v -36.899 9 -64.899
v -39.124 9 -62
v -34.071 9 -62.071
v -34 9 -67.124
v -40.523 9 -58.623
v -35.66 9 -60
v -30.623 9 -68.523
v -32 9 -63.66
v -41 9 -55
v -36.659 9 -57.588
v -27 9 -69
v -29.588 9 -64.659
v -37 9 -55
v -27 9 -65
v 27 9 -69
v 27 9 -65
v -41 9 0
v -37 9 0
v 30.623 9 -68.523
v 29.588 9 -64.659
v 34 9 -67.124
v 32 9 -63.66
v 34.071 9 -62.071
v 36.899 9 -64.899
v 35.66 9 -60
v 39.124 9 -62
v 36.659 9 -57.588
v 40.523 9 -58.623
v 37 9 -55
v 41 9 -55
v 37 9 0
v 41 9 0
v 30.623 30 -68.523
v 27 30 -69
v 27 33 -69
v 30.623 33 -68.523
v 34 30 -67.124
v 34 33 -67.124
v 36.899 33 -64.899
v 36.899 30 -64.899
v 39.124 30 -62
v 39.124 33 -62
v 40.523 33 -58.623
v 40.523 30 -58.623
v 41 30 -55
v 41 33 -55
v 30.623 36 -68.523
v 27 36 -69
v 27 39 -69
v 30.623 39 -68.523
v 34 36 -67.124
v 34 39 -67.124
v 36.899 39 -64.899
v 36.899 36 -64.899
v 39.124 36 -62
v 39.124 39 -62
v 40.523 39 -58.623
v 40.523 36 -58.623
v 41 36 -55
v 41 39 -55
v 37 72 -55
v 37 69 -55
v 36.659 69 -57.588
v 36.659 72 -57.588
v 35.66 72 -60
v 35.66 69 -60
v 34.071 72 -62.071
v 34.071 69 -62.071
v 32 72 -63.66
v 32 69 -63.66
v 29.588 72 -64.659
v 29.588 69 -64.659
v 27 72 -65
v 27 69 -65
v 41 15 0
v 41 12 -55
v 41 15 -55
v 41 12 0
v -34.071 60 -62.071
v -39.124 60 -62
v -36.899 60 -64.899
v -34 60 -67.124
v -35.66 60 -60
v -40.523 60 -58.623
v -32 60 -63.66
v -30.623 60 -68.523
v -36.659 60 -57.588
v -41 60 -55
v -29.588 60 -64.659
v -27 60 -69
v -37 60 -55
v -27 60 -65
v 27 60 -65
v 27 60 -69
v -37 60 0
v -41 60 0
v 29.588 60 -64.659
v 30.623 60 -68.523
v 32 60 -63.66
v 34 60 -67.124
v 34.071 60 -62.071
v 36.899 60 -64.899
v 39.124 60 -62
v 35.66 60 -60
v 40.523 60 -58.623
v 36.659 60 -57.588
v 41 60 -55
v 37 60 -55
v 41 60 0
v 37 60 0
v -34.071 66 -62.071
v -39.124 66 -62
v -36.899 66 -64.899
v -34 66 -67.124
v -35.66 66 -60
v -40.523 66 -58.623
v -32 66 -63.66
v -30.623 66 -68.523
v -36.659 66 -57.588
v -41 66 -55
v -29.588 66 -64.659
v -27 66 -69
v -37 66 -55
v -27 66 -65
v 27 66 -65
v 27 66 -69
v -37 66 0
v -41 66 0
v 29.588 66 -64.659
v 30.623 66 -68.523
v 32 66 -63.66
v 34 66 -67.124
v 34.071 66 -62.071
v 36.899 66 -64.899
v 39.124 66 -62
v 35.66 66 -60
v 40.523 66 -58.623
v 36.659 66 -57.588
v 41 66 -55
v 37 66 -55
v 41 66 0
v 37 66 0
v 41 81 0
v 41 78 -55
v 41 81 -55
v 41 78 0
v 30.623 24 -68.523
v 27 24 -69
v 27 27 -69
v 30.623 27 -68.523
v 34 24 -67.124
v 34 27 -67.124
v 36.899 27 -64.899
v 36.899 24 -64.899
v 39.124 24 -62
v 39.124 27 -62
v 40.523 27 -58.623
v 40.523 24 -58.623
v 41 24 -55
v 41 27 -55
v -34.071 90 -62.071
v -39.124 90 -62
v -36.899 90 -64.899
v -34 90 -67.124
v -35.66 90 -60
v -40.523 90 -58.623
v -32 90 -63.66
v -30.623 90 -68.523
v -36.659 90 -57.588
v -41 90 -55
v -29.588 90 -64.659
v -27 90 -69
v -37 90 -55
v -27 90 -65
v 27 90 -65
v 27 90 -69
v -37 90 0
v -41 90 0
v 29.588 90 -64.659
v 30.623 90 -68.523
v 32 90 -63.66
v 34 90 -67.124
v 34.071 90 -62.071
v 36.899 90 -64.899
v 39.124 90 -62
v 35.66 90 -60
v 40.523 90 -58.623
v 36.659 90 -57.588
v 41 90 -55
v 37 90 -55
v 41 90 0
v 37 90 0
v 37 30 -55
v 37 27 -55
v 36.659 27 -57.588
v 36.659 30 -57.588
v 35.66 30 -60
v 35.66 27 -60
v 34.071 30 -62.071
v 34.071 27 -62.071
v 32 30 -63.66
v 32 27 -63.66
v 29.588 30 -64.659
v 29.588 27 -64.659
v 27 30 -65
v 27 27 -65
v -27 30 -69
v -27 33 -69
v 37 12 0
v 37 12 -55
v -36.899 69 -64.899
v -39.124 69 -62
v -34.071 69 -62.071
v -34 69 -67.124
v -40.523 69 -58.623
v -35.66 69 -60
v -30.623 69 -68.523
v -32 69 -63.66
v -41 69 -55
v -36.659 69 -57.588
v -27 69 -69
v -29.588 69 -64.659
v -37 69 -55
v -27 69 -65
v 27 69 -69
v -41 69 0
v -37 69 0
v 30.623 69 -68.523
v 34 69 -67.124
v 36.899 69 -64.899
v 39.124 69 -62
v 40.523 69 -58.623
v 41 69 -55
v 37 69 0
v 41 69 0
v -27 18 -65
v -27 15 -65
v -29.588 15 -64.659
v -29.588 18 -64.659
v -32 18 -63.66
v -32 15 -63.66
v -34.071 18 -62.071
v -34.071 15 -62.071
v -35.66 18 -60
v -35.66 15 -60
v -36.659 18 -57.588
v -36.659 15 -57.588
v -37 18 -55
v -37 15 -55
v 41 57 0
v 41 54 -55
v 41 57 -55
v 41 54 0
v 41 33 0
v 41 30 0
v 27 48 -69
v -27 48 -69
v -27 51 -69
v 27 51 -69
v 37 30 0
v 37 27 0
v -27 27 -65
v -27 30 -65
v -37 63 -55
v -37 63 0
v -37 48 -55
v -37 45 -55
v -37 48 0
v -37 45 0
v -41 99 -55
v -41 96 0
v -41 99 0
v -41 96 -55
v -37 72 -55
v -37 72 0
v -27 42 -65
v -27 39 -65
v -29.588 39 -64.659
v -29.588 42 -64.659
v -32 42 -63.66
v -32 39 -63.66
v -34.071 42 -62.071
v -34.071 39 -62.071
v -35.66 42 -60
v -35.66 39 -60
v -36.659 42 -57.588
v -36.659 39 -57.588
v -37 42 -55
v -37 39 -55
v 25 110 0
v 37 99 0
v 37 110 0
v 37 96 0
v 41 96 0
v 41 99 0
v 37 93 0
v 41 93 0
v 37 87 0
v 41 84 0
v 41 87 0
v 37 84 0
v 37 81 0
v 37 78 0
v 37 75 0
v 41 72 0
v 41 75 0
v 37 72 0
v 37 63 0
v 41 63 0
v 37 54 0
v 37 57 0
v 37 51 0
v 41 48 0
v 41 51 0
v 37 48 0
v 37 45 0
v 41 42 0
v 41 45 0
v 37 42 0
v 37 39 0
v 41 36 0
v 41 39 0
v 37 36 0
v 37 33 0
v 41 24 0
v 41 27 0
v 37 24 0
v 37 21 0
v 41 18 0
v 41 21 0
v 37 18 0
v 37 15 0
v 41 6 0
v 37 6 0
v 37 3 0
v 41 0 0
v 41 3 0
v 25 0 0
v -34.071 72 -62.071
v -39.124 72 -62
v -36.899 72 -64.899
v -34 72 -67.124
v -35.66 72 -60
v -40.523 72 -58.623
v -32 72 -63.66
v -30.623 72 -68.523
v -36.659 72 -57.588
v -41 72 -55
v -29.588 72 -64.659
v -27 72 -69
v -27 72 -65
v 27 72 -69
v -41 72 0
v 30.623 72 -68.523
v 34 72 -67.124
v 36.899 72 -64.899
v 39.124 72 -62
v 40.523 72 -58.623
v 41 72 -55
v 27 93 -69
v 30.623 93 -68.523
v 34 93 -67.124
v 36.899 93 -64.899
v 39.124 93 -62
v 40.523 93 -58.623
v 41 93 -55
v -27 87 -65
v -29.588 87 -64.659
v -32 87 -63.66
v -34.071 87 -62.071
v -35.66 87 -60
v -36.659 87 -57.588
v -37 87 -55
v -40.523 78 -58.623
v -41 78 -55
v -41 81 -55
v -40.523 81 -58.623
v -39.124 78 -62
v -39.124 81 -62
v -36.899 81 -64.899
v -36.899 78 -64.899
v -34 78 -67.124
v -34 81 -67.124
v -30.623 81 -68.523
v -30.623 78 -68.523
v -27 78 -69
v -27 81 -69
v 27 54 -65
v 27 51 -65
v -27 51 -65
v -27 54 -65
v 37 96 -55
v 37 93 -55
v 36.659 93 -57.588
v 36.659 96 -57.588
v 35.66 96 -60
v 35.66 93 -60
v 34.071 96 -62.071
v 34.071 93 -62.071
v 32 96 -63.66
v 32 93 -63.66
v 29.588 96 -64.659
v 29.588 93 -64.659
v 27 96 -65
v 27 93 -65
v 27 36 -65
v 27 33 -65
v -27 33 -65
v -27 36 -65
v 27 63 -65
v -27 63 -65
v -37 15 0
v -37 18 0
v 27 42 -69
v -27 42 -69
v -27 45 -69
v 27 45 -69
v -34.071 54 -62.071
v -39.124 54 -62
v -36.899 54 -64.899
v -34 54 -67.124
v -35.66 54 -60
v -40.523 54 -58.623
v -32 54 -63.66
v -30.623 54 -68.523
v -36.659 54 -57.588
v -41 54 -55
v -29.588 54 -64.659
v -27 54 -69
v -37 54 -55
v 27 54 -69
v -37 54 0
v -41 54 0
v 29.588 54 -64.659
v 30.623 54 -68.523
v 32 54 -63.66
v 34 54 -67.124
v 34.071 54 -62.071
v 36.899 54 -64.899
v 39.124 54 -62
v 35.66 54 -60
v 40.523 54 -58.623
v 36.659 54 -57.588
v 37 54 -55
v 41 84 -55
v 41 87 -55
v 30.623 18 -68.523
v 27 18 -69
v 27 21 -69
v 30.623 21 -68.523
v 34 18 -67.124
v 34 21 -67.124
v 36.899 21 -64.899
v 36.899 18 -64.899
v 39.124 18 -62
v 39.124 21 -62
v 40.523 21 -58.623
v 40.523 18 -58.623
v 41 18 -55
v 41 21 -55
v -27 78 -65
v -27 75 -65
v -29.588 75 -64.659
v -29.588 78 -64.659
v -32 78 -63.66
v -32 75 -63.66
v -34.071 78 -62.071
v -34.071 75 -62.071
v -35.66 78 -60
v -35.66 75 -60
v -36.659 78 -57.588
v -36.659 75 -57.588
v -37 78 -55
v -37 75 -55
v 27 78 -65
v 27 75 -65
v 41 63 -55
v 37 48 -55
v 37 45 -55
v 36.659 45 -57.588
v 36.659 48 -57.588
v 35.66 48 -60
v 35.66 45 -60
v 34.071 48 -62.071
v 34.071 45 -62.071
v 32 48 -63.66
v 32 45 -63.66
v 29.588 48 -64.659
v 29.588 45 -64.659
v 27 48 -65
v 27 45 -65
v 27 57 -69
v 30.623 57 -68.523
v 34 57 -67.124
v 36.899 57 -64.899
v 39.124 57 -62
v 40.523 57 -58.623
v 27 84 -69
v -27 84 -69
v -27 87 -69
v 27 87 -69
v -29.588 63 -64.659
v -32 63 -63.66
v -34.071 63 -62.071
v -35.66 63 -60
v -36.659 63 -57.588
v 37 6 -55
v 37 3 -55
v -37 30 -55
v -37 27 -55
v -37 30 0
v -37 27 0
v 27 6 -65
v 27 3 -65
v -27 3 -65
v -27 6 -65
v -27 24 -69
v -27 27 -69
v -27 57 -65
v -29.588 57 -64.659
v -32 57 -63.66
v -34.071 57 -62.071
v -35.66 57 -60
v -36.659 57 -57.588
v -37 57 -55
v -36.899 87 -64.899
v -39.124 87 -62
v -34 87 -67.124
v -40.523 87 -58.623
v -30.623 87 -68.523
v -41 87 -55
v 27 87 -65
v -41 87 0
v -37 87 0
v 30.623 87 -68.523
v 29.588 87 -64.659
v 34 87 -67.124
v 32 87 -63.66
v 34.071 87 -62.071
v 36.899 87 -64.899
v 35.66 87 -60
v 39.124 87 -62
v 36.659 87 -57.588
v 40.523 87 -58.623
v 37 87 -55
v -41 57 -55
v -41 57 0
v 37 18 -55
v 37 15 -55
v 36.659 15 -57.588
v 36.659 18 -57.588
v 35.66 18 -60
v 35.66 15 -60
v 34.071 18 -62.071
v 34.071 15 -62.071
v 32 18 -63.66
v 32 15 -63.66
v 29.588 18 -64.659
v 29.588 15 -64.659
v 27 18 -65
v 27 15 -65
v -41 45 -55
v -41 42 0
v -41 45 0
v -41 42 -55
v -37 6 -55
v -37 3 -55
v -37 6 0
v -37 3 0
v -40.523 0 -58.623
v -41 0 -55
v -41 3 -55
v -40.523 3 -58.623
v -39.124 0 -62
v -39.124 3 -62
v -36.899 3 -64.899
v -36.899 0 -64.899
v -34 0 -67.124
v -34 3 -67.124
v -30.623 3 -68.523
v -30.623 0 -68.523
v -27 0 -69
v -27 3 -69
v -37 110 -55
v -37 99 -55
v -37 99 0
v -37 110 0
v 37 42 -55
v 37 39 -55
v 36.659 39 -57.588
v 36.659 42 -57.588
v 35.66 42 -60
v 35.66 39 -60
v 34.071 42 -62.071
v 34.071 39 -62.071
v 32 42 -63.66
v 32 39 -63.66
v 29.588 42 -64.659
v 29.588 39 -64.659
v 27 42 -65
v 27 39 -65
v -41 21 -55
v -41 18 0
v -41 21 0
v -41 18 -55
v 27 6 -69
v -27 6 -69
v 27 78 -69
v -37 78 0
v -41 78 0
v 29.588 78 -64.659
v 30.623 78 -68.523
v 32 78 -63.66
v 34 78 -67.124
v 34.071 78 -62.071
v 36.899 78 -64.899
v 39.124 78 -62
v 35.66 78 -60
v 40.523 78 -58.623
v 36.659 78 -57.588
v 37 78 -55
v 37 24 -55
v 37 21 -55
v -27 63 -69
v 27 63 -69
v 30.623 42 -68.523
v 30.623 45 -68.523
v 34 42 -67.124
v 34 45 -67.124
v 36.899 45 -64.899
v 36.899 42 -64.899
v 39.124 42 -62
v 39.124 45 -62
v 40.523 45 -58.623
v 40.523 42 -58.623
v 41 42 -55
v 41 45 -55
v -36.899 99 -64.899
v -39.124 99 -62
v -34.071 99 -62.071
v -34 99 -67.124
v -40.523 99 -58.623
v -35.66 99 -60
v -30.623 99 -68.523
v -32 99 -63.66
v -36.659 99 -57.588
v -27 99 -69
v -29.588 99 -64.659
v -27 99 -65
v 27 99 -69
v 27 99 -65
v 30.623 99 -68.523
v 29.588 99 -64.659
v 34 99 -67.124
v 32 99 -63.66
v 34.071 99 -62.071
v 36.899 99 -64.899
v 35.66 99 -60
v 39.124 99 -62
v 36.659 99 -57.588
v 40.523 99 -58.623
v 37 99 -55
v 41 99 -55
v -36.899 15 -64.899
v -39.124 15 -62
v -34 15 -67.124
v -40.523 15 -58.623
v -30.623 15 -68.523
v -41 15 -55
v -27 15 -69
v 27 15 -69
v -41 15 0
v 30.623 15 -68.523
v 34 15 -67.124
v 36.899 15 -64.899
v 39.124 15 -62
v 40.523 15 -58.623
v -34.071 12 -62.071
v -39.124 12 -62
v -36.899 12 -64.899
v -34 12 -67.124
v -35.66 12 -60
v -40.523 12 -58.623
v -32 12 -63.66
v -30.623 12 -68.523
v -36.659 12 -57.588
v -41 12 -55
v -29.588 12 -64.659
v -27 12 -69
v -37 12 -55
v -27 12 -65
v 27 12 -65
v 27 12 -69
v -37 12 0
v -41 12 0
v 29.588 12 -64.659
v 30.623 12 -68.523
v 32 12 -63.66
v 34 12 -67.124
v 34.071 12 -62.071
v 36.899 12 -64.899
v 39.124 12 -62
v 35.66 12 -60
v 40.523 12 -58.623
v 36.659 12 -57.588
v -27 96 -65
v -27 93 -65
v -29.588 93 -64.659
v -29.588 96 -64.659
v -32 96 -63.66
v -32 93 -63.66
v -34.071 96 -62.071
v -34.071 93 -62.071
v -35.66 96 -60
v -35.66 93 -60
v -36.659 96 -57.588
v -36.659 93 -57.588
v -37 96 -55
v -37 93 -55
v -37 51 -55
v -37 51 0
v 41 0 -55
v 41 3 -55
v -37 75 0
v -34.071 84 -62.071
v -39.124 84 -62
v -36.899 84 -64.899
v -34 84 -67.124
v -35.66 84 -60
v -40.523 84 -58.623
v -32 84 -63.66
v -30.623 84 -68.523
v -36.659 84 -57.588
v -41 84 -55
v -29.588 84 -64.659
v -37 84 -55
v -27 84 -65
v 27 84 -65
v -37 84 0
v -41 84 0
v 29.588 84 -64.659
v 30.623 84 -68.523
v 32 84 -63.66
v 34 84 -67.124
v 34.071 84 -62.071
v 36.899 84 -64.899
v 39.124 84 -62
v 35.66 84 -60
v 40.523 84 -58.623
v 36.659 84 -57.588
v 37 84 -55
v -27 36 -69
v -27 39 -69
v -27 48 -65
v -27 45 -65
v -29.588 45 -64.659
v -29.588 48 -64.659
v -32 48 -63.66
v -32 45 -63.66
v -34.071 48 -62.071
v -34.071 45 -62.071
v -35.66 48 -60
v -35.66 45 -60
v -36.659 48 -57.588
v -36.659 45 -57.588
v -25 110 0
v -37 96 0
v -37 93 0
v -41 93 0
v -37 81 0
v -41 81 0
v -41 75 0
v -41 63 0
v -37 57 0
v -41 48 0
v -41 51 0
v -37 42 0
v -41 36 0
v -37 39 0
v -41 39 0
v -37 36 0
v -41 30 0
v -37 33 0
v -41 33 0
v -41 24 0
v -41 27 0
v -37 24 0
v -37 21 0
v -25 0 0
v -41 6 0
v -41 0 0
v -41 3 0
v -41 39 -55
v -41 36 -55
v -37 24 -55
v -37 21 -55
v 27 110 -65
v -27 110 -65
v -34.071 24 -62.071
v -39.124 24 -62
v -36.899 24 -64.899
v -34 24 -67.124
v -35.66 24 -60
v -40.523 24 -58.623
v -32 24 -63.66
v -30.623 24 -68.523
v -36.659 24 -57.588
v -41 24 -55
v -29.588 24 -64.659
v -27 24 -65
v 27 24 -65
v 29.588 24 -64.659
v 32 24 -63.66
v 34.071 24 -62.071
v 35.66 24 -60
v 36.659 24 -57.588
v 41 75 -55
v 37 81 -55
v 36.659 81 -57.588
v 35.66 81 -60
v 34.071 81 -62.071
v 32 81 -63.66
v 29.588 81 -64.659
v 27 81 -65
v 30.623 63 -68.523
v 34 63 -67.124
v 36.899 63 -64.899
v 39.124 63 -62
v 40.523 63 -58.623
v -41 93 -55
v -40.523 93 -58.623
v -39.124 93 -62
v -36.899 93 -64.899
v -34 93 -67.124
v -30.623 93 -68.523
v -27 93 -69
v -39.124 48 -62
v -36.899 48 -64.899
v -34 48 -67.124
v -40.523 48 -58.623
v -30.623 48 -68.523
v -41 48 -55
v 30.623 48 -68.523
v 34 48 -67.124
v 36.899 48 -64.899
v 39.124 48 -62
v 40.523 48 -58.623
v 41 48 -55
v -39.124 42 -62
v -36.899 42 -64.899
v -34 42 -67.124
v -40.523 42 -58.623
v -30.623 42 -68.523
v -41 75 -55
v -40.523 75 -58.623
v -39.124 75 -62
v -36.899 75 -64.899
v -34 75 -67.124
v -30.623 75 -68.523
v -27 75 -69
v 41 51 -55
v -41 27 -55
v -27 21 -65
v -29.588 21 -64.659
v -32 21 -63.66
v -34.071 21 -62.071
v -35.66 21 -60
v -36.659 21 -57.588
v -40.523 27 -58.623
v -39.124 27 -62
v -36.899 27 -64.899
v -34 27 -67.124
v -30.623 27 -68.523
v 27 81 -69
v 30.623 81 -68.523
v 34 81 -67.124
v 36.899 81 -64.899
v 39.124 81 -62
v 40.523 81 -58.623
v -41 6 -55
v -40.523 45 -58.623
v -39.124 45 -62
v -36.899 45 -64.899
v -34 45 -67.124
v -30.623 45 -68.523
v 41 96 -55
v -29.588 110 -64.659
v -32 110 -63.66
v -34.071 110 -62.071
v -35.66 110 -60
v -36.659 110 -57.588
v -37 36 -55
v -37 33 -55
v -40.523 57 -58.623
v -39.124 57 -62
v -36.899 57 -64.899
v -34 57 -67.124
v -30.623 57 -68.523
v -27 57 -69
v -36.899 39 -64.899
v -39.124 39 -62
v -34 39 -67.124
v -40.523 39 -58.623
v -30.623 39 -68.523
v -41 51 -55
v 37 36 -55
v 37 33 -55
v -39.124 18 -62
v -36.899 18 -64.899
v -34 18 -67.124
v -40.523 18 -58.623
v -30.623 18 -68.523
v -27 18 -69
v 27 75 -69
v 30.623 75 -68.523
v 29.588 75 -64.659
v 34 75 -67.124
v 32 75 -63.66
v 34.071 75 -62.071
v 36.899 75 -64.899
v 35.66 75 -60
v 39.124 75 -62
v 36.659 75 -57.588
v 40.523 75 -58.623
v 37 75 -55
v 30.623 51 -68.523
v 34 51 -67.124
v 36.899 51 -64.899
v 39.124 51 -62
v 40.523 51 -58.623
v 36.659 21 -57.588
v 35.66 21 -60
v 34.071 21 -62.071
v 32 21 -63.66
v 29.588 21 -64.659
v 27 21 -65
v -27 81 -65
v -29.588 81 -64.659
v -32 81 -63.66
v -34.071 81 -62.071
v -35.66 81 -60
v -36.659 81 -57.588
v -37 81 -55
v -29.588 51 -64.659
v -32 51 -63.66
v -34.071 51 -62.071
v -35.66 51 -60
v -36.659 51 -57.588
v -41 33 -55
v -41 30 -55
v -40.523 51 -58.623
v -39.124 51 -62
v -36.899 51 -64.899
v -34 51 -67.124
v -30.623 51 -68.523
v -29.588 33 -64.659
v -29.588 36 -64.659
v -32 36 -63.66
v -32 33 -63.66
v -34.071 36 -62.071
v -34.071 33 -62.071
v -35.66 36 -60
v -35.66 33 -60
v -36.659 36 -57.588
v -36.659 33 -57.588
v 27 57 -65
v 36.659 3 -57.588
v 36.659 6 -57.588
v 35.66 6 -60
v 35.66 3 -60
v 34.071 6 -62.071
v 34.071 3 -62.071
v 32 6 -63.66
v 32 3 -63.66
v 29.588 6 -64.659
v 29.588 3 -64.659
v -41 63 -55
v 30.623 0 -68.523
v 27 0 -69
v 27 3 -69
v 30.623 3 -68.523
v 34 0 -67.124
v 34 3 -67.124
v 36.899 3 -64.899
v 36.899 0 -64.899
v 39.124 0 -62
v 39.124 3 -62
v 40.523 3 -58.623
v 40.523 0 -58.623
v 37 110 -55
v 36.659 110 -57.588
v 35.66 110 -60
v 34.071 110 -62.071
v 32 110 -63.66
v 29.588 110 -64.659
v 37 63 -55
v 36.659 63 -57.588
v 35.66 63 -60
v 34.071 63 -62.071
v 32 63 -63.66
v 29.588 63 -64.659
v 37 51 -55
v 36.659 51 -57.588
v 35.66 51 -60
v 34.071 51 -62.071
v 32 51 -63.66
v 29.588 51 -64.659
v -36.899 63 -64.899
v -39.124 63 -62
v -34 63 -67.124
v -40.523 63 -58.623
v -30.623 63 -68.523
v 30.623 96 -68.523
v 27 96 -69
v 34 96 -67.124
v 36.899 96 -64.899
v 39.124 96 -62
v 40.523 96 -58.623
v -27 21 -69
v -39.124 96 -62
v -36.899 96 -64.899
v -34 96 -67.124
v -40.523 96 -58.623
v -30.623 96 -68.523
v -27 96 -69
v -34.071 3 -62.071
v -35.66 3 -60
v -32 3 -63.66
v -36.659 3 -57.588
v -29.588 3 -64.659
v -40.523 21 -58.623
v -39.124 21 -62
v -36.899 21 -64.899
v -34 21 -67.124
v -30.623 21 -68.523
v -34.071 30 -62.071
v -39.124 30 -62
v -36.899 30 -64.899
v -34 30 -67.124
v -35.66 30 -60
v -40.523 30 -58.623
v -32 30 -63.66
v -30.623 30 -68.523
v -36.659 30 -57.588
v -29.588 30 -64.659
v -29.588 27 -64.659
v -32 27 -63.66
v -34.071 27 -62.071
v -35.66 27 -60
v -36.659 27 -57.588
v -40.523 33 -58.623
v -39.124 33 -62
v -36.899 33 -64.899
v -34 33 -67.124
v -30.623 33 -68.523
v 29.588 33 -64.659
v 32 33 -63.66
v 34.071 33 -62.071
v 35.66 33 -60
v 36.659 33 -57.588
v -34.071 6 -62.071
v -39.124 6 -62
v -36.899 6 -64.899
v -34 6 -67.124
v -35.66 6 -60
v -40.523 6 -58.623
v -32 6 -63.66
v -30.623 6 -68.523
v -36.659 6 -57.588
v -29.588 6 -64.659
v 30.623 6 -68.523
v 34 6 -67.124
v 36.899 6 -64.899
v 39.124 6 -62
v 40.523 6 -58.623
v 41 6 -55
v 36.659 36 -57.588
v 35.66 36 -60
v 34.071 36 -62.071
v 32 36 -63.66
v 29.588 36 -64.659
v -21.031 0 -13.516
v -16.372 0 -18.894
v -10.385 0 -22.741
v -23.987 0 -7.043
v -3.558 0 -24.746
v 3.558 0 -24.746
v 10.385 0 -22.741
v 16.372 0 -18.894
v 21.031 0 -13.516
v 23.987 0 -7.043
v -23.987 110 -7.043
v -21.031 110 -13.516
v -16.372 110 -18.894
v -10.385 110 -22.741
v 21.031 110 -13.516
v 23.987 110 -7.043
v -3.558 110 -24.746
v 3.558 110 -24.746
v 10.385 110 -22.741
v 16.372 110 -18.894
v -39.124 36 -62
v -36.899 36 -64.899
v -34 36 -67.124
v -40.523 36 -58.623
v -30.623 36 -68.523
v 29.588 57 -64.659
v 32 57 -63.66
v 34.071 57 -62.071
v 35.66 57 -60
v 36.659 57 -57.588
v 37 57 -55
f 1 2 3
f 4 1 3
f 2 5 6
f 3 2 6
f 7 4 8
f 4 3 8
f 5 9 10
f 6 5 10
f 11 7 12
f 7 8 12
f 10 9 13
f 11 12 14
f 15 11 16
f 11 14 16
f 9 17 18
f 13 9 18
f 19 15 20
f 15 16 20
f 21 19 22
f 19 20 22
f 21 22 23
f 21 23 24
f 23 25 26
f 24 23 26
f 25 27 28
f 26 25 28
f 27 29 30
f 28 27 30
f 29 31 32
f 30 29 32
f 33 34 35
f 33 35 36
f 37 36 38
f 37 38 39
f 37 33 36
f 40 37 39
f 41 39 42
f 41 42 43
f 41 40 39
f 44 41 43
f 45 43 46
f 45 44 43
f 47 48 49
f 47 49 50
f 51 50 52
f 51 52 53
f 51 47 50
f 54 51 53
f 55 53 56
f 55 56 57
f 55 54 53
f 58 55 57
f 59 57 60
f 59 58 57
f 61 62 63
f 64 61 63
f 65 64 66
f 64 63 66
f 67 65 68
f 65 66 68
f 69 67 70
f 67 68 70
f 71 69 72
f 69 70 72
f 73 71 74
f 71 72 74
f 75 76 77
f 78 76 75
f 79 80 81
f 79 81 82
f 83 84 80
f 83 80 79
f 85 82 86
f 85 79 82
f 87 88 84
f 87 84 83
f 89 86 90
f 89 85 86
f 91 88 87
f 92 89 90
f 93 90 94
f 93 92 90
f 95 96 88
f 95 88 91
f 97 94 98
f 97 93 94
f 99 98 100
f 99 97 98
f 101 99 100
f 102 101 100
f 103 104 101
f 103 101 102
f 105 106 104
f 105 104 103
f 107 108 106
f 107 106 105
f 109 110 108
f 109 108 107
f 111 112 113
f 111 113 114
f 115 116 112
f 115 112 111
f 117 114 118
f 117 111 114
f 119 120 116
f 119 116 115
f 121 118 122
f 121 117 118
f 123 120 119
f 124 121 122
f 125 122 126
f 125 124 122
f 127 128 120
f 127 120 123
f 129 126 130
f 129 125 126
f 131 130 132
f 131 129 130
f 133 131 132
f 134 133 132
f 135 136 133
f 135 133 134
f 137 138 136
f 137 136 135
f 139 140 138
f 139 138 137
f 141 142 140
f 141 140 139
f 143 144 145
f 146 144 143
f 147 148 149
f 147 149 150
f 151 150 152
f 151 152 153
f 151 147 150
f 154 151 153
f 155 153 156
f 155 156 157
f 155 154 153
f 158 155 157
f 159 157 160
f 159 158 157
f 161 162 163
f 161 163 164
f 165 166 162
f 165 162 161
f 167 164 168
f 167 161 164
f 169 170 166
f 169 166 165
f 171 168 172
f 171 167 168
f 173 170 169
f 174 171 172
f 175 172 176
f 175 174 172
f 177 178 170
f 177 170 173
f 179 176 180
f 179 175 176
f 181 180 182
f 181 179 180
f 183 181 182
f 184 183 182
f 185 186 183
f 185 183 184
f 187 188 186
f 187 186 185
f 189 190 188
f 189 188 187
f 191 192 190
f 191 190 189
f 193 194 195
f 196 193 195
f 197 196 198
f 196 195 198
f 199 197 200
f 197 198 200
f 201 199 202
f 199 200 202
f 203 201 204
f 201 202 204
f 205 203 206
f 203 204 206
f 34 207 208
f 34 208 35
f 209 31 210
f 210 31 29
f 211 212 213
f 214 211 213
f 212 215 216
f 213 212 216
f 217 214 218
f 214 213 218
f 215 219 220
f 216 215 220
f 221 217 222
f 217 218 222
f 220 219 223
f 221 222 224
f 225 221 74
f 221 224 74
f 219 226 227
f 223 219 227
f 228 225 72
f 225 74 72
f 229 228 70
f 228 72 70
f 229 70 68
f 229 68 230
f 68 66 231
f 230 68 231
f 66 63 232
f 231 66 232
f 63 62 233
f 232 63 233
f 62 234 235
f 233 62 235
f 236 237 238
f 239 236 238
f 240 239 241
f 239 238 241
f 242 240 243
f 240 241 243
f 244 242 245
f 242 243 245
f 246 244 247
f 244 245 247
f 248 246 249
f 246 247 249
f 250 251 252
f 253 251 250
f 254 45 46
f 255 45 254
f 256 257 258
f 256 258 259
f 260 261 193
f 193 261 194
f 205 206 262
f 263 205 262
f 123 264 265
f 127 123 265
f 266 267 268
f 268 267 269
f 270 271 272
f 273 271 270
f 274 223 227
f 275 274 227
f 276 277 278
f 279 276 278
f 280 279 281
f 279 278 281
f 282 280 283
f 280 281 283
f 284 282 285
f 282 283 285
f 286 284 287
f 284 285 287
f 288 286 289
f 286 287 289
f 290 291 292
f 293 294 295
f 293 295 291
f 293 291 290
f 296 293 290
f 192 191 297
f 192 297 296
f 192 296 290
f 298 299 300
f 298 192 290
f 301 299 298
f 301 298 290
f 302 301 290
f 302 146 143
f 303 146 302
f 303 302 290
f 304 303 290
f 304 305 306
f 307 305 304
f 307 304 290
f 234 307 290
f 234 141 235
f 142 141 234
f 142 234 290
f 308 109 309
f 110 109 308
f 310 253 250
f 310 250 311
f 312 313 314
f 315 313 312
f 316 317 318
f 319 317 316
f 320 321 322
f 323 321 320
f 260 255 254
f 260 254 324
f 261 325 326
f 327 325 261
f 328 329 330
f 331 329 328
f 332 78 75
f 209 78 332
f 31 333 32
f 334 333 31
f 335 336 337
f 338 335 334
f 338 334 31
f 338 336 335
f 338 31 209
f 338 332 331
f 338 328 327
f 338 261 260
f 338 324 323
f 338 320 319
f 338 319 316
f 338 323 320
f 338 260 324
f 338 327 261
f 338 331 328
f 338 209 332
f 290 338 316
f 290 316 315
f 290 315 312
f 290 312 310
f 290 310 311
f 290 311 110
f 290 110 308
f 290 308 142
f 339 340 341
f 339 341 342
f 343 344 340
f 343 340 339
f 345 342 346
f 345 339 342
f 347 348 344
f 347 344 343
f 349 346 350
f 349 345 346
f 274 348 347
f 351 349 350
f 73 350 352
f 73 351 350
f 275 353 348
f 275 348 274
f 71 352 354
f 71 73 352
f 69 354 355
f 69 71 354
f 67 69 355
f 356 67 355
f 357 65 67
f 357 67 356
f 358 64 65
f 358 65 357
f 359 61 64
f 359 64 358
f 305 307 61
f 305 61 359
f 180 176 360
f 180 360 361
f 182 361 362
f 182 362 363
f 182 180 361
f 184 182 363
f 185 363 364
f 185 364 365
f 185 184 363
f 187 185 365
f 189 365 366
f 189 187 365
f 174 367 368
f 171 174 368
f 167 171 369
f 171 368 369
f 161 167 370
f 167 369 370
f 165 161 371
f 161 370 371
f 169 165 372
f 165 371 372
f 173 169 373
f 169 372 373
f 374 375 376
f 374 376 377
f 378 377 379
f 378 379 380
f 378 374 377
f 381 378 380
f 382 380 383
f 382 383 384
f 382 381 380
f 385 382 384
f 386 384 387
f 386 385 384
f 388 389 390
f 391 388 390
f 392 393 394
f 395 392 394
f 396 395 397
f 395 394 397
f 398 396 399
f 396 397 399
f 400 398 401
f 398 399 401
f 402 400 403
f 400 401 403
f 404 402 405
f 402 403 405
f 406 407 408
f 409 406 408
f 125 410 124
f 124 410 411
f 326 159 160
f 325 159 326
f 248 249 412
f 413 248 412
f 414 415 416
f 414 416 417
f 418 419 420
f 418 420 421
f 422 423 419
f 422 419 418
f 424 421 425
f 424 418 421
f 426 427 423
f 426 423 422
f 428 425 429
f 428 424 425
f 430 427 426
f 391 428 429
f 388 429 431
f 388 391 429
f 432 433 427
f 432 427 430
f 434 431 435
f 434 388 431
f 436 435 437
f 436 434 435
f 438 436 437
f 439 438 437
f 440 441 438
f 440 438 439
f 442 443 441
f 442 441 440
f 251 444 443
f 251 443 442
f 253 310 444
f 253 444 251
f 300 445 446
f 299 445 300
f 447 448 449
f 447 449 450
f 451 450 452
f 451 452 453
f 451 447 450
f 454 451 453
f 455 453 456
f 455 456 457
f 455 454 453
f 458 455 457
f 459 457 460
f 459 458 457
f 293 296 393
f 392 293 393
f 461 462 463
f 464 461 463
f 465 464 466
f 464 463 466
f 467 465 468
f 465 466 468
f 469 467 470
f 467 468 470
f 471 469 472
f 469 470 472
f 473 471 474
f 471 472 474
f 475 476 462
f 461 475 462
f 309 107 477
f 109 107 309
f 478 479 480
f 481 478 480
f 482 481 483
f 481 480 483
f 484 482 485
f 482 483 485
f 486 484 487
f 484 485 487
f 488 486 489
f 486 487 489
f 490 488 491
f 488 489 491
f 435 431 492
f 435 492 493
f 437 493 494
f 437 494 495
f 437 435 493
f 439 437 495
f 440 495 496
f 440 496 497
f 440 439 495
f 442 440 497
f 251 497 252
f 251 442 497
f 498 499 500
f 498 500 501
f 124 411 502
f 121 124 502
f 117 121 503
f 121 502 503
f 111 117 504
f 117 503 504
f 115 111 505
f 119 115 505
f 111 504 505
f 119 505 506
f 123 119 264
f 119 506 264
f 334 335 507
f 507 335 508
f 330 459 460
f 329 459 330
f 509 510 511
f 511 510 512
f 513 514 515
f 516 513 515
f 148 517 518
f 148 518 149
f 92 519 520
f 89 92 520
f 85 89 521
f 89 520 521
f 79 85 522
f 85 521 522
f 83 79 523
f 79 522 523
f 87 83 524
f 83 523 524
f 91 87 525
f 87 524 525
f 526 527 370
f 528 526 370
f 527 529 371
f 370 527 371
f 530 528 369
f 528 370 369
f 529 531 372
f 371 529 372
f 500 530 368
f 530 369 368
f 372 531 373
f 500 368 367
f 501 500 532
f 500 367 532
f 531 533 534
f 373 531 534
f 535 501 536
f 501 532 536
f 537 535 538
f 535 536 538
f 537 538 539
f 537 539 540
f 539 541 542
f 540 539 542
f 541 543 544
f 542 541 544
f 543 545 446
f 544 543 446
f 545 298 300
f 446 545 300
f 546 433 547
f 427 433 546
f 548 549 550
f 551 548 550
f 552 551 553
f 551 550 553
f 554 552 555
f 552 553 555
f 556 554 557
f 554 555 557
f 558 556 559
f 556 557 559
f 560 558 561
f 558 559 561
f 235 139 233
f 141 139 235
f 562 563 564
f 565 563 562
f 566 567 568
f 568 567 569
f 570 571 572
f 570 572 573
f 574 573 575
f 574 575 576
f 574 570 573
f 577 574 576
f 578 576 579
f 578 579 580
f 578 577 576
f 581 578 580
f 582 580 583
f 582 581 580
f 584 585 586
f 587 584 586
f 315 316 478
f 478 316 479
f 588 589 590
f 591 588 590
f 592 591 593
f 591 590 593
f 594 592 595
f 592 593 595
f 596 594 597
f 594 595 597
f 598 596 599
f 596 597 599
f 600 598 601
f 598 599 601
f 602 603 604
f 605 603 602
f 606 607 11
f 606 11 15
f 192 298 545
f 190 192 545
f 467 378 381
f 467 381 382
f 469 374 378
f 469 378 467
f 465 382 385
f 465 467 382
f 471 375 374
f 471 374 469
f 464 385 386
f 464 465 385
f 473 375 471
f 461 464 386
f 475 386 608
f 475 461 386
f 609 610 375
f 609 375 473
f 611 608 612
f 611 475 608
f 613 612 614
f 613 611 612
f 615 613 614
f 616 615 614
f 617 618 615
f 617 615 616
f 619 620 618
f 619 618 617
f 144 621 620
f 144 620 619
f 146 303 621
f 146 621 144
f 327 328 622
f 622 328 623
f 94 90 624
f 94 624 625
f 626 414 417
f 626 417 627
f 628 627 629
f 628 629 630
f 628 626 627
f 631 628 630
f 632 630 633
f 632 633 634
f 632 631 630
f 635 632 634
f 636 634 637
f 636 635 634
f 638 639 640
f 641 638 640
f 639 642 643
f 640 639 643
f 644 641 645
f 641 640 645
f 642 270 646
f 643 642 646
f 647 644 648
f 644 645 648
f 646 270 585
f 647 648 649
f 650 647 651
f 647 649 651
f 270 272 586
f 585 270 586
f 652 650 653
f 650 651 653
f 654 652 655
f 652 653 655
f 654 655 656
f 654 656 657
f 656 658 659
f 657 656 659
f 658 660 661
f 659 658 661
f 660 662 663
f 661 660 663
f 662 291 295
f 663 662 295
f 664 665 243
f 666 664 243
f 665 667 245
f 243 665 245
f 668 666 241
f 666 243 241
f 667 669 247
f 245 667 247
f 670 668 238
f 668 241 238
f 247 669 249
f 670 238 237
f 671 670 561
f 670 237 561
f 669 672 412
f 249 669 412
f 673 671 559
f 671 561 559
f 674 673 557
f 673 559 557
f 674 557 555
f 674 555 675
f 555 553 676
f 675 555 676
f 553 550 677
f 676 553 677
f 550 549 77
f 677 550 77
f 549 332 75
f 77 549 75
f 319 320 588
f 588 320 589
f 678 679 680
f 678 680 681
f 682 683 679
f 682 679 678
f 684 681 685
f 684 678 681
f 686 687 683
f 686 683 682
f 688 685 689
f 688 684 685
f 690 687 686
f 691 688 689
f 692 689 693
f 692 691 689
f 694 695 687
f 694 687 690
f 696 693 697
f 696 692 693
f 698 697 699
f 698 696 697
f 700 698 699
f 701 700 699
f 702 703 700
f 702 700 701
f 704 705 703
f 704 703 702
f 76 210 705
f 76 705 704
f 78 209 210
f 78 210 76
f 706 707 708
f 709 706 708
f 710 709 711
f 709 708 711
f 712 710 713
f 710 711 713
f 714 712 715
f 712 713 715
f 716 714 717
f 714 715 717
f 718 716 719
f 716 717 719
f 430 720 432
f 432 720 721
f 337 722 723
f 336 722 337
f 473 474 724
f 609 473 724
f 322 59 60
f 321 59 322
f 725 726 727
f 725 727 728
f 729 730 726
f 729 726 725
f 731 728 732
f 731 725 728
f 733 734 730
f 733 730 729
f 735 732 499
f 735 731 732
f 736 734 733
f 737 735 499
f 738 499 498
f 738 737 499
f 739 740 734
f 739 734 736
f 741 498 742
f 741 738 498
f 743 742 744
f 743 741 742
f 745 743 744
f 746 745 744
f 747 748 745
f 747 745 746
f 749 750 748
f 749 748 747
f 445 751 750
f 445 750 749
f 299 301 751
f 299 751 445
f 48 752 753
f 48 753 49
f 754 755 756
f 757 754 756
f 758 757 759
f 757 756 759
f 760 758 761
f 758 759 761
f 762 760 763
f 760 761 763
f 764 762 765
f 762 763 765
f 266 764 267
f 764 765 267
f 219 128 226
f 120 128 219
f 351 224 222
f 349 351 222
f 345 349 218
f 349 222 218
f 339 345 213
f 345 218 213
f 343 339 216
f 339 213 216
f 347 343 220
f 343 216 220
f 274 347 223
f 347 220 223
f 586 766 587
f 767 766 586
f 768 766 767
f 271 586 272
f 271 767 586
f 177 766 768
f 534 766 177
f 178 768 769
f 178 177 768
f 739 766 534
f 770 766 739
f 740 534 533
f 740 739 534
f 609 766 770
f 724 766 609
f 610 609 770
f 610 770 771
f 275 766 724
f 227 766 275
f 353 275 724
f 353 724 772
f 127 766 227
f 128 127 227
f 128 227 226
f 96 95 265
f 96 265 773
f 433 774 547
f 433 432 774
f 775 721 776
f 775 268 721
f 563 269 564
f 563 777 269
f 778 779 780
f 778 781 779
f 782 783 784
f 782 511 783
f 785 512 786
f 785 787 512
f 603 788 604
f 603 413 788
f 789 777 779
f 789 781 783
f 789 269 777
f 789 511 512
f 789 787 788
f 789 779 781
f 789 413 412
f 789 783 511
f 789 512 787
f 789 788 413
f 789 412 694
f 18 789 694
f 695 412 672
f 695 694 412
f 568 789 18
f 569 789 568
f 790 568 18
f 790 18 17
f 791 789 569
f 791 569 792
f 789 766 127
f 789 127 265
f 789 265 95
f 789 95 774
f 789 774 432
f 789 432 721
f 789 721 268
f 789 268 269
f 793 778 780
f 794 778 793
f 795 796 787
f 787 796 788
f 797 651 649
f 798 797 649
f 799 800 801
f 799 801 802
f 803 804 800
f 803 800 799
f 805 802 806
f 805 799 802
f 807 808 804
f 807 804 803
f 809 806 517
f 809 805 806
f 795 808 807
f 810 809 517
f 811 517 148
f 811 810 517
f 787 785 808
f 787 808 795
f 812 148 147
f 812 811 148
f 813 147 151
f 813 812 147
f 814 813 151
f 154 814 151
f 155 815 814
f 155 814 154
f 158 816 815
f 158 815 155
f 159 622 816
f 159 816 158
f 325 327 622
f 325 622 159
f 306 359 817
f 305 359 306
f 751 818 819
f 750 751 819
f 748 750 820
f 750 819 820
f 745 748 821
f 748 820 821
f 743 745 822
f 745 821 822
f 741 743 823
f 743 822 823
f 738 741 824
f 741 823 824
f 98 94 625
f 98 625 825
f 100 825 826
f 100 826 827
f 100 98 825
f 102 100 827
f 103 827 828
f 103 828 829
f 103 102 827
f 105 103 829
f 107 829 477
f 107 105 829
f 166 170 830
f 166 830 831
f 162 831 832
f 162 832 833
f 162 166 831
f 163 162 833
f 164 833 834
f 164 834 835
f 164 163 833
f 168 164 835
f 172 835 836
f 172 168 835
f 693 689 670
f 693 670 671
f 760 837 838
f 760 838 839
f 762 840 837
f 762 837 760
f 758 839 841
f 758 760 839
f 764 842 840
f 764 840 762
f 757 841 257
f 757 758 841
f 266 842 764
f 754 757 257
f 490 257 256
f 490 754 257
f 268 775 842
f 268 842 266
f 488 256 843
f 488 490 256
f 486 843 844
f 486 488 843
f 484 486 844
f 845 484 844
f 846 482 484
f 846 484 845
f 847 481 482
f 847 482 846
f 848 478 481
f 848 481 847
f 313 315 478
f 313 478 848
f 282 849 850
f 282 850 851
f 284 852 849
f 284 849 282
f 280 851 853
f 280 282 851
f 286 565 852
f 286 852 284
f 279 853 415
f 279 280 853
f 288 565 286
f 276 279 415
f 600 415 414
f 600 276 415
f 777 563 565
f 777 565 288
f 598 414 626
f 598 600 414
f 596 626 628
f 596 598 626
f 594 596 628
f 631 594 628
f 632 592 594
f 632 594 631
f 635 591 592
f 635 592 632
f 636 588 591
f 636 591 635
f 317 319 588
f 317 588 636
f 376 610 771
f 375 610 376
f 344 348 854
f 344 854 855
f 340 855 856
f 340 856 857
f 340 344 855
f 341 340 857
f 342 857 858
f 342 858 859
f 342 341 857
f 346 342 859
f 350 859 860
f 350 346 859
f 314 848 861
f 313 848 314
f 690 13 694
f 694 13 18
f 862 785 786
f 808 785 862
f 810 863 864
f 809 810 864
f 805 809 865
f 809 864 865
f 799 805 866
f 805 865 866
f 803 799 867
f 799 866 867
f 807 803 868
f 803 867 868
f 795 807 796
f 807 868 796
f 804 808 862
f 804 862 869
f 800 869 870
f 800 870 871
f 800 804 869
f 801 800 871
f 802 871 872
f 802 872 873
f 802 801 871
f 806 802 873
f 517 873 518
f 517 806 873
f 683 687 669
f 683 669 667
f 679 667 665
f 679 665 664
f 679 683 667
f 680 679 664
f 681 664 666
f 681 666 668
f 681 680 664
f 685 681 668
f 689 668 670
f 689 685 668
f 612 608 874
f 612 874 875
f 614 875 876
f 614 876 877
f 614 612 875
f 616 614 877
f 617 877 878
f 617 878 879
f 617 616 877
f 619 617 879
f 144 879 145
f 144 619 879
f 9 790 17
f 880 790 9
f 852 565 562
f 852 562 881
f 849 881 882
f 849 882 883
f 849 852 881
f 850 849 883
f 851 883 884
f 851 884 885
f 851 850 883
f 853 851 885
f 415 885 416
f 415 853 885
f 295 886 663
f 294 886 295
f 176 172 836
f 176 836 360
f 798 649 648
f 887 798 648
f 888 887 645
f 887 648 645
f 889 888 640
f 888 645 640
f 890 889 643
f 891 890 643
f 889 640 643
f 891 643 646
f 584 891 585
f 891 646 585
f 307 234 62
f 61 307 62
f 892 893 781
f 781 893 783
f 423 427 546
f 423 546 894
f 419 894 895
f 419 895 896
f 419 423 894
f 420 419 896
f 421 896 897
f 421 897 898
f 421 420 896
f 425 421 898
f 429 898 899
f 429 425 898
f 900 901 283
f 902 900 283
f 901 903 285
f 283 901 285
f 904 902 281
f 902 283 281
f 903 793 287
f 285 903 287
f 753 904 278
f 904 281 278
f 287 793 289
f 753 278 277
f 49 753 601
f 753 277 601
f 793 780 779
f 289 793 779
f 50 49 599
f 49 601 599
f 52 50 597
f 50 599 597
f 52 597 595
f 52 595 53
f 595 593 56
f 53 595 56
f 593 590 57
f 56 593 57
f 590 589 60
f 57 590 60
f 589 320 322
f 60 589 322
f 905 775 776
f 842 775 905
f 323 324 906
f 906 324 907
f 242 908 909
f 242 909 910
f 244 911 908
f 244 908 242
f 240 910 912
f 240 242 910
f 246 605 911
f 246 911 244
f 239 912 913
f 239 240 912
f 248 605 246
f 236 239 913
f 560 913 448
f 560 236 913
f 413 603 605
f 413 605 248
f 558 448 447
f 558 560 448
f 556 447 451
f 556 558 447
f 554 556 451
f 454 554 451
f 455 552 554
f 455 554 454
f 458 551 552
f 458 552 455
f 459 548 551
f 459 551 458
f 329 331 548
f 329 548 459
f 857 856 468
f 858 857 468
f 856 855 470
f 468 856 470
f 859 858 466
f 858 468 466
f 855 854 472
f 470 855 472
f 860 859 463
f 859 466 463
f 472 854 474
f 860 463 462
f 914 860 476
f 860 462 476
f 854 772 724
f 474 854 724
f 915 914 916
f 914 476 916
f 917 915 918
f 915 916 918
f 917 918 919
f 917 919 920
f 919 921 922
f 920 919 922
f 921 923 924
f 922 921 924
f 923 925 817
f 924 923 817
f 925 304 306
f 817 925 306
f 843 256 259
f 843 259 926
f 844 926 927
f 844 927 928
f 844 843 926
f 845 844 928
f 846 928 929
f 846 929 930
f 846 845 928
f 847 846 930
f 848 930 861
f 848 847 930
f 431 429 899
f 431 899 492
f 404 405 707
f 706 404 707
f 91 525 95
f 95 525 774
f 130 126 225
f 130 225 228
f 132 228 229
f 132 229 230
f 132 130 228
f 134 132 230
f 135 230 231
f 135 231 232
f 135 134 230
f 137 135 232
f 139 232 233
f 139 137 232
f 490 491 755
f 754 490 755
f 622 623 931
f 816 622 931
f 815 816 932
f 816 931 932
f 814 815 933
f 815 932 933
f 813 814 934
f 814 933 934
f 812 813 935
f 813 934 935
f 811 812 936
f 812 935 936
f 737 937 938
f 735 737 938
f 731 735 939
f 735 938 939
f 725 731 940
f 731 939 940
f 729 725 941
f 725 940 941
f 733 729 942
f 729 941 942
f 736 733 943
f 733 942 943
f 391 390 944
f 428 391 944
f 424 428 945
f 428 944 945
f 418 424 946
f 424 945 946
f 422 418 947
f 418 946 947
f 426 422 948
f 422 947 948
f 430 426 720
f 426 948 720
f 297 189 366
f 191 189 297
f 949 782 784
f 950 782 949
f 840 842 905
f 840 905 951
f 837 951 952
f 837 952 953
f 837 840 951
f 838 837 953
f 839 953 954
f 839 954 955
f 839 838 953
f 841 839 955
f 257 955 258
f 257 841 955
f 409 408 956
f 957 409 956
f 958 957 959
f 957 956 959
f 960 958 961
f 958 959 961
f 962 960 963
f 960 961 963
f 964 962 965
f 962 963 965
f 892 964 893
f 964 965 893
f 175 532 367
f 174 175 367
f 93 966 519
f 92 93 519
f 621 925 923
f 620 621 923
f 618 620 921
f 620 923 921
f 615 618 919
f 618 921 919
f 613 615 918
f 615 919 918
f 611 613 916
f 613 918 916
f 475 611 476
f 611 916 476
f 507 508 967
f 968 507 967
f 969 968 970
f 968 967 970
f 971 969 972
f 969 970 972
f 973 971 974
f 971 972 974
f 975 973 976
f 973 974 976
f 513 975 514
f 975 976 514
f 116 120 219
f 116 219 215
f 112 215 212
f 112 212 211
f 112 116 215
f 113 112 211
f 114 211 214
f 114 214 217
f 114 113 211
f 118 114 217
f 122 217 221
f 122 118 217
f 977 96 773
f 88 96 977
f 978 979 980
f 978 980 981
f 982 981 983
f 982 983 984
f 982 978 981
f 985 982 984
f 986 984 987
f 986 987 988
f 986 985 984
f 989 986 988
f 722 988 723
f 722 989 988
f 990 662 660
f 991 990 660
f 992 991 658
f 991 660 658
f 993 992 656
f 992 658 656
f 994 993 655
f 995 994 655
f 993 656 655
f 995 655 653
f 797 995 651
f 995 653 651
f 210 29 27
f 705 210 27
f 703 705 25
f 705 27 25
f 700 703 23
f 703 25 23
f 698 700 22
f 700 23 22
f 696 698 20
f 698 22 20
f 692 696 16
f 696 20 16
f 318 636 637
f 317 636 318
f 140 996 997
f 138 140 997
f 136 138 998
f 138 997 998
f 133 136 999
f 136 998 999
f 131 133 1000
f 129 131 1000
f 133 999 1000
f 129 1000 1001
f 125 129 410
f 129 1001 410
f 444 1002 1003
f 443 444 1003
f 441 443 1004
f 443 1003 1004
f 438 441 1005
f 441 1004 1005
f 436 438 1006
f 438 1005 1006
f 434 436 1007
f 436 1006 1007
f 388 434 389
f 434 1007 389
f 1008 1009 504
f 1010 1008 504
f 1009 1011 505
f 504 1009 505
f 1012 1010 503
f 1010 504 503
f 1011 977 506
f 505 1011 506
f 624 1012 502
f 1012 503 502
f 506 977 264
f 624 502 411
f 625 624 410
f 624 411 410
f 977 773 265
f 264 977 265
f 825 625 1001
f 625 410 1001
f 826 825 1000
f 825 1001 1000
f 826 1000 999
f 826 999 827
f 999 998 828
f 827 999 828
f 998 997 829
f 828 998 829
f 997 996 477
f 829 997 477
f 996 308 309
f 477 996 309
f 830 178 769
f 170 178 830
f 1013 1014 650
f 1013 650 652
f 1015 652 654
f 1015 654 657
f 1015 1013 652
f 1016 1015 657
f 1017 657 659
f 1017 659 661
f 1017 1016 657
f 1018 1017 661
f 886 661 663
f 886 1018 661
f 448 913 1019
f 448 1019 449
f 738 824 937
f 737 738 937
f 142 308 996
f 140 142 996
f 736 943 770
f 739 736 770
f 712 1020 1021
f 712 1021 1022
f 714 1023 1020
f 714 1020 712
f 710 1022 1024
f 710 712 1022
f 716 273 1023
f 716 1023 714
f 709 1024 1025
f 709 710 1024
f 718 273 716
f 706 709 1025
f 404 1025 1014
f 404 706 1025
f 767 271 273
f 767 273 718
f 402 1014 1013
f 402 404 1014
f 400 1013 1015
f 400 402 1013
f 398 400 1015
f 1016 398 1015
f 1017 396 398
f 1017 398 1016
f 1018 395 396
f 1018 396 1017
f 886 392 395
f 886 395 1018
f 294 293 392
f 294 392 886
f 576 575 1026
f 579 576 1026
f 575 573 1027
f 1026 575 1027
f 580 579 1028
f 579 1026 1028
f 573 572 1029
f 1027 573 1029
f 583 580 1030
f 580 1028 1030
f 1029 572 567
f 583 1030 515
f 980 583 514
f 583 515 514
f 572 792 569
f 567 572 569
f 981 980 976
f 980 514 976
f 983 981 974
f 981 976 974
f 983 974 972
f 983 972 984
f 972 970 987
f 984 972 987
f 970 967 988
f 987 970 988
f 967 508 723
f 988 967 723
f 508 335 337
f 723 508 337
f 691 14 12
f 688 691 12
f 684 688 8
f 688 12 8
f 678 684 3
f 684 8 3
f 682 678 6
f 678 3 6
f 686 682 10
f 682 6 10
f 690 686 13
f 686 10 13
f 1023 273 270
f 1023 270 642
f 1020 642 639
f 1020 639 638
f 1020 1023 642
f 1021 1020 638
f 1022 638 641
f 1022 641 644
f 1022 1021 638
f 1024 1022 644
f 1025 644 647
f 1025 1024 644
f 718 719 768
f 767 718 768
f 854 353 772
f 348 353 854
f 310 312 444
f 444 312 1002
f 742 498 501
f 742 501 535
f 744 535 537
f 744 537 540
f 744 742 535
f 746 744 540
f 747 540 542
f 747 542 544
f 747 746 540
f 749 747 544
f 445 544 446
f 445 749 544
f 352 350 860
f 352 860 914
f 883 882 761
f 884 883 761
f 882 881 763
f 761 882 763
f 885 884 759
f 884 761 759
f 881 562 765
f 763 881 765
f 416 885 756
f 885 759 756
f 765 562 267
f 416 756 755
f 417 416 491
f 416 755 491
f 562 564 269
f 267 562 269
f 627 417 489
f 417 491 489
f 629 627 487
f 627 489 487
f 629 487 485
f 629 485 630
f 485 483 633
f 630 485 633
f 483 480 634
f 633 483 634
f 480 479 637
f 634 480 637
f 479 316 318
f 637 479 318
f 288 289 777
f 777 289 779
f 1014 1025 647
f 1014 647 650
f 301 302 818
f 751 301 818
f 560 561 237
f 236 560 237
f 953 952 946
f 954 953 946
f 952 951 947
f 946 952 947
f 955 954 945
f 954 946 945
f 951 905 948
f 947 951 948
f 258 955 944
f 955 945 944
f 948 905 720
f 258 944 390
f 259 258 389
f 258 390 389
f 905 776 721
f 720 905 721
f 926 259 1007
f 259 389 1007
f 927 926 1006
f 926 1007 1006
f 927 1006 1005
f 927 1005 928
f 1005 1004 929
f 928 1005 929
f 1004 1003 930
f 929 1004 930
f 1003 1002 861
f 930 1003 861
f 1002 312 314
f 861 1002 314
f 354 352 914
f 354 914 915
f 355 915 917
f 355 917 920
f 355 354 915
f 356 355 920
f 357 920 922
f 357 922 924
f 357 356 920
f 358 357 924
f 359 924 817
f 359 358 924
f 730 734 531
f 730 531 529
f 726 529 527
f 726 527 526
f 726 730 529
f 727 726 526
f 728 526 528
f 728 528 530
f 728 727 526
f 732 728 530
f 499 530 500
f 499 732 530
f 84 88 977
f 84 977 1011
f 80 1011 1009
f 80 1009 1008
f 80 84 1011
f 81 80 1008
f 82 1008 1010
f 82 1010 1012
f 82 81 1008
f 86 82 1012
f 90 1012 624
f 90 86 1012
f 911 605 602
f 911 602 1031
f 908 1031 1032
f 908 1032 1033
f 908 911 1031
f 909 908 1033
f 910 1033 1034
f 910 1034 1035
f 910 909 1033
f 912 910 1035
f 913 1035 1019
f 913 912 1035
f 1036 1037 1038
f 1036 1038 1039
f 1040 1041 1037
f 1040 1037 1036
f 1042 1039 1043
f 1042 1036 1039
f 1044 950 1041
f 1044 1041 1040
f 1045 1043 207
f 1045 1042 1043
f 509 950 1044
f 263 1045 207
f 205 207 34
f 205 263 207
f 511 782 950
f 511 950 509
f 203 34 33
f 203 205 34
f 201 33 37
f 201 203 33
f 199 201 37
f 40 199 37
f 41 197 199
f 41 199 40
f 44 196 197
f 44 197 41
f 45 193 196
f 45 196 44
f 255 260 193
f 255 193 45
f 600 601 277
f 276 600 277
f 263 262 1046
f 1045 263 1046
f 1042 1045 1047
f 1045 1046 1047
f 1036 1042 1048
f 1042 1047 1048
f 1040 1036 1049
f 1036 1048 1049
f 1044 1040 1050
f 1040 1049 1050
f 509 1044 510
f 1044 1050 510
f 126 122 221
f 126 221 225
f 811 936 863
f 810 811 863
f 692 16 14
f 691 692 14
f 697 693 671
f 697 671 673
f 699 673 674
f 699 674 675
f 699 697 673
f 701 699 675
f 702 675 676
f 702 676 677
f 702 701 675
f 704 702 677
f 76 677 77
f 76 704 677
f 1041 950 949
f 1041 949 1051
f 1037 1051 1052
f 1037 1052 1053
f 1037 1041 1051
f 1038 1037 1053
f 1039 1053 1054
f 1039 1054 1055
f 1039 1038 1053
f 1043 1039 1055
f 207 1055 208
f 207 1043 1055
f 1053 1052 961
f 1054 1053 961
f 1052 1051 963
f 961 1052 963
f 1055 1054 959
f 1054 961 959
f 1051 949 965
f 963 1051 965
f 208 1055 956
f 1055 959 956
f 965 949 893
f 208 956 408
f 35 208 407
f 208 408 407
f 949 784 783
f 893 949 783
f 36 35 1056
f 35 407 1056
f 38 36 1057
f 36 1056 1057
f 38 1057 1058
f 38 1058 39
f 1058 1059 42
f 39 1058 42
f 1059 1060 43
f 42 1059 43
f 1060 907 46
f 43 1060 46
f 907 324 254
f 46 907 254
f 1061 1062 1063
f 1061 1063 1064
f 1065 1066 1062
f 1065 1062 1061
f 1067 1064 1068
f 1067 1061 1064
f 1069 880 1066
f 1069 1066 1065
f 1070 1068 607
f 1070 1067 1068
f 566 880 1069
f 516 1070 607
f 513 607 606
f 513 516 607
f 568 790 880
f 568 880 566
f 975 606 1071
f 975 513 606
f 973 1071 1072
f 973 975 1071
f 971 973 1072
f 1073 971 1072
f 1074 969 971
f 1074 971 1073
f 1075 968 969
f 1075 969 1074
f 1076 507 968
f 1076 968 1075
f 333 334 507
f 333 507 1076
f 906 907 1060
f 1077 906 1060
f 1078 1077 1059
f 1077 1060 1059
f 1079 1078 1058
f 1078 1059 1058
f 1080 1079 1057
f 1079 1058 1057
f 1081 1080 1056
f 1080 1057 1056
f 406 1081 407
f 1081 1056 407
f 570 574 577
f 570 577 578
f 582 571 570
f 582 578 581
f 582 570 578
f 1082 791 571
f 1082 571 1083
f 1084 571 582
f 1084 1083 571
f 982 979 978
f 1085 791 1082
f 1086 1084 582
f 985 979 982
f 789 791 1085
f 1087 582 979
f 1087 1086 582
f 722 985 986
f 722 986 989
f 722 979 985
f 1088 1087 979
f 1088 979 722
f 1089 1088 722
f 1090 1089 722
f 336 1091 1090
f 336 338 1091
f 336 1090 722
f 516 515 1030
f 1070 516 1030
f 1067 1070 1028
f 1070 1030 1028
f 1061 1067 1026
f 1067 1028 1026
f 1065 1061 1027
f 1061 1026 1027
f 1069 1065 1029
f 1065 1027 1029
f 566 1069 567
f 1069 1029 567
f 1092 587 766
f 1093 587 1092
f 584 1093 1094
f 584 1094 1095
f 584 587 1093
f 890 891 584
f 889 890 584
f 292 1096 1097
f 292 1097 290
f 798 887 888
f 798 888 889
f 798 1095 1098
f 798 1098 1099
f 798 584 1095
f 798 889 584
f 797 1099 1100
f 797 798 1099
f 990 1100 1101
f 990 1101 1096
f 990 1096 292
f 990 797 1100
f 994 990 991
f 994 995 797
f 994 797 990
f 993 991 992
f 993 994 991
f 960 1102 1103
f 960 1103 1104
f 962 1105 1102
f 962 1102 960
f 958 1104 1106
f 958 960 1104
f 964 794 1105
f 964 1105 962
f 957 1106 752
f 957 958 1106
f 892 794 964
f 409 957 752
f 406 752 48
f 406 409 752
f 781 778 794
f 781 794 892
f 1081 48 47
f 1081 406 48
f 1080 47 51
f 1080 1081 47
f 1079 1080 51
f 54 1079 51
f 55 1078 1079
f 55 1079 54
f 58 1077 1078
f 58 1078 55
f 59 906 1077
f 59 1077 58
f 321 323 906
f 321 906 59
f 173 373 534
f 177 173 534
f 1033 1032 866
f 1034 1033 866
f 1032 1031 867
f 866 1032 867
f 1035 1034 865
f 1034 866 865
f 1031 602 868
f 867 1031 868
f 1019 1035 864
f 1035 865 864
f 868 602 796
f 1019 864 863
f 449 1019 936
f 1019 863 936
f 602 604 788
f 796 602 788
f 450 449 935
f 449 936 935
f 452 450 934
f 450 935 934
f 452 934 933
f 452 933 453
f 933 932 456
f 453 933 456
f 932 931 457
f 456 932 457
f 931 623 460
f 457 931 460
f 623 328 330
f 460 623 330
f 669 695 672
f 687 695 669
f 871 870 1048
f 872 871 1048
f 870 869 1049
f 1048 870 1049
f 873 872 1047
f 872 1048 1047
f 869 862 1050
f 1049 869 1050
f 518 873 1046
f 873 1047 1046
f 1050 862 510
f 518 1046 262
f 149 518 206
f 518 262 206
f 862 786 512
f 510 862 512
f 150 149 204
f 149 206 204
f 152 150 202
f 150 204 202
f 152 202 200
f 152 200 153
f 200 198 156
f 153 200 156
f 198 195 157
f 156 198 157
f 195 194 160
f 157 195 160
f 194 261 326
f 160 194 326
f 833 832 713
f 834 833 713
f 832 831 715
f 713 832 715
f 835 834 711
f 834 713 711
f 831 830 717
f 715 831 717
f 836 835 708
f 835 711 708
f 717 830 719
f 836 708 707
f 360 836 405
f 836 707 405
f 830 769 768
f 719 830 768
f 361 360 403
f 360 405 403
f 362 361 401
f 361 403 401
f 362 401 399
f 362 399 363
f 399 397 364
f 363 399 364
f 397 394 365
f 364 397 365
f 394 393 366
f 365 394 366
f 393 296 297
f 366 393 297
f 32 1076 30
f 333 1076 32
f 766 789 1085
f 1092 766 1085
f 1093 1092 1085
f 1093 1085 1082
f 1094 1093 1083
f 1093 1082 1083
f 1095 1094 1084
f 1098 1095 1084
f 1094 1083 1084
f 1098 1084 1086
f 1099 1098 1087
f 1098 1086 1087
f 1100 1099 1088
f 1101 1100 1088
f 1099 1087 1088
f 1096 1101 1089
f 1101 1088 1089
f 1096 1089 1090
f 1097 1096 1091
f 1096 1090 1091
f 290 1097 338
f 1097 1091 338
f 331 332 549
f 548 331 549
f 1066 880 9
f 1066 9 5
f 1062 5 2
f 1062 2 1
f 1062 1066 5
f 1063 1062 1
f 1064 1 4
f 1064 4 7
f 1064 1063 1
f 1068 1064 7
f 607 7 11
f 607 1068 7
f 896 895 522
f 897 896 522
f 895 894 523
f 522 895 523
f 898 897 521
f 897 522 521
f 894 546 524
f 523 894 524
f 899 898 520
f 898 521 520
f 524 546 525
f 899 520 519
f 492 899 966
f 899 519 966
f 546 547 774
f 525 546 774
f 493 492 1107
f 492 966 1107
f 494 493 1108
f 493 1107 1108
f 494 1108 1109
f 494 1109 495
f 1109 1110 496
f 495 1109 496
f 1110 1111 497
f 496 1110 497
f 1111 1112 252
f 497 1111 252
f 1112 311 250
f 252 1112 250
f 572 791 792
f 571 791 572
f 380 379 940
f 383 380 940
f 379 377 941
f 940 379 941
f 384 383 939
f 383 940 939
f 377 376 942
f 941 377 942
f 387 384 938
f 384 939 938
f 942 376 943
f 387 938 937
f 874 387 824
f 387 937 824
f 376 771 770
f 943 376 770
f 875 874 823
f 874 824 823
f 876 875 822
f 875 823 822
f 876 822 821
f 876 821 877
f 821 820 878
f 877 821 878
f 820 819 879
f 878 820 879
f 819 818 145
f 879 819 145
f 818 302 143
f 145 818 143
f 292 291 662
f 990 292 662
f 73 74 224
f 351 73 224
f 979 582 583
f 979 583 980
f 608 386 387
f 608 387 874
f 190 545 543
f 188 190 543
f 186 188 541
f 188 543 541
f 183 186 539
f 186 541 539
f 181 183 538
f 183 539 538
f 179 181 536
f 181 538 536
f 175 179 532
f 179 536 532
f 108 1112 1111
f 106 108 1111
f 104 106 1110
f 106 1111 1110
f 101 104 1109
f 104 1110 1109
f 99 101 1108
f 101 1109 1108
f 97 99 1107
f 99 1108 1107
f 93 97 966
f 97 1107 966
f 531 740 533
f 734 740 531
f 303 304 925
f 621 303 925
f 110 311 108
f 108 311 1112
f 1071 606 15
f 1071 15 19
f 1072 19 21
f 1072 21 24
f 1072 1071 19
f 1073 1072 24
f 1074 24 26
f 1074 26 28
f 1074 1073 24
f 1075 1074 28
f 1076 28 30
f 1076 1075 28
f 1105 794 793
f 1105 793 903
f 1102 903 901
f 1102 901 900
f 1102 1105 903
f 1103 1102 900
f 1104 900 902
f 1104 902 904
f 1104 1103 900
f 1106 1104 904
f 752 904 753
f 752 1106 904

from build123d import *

# Parameters (mm, degrees)
BOSS_EXTRUDE1_DEPTH = 110
BOSS_EXTRUDE2_DEPTH = 3
LPATTERN2_COUNT     = 17
LPATTERN2_PITCH     = 6


with BuildPart() as part:
    # Sketch2 → Boss-Extrude1 (new body)
    with BuildSketch(Plane(origin=(0, 0, 0), x_dir=(1, 0, 0), z_dir=(0, 1, 0))):
        with BuildLine():
            Line((25, 0), (37, 0))
            Line((37, 0), (37, 55))
            ThreePointArc((37, 55), (34.071067812, 62.071067812), (27, 65))
            Line((27, 65), (-27, 65))
            ThreePointArc((-27, 65), (-34.071067812, 62.071067812), (-37, 55))
            Line((-37, 55), (-37, 0))
            Line((-37, 0), (-25, 0))
            ThreePointArc((-25, 0), (0, 25), (25, 0))
        make_face()
    extrude(amount=BOSS_EXTRUDE1_DEPTH)

    # Sketch3 → Boss-Extrude2 (add)
    with BuildSketch(Plane.XZ):
        with BuildLine():
            Line((-41, 0), (-41, -55))
            ThreePointArc((-41, -55), (-36.899494937, -64.899494937), (-27, -69))
            Line((-27, -69), (27, -69))
            ThreePointArc((27, -69), (36.899494937, -64.899494937), (41, -55))
            Line((41, -55), (41, 0))
            Line((41, 0), (37, 0))
            Line((37, 0), (37, -55))
            ThreePointArc((37, -55), (34.071067812, -62.071067812), (27, -65))
            Line((27, -65), (-27, -65))
            ThreePointArc((-27, -65), (-34.071067812, -62.071067812), (-37, -55))
            Line((-37, -55), (-37, 0))
            Line((-37, 0), (-41, 0))
        make_face()
    boss_extrude2 = extrude(amount=-BOSS_EXTRUDE2_DEPTH)

    # LPattern2: Boss-Extrude2 ×17
    with Locations(*[(0, i * LPATTERN2_PITCH, 0) for i in range(1, LPATTERN2_COUNT)]):
        add(boss_extrude2)


solid = part.part
